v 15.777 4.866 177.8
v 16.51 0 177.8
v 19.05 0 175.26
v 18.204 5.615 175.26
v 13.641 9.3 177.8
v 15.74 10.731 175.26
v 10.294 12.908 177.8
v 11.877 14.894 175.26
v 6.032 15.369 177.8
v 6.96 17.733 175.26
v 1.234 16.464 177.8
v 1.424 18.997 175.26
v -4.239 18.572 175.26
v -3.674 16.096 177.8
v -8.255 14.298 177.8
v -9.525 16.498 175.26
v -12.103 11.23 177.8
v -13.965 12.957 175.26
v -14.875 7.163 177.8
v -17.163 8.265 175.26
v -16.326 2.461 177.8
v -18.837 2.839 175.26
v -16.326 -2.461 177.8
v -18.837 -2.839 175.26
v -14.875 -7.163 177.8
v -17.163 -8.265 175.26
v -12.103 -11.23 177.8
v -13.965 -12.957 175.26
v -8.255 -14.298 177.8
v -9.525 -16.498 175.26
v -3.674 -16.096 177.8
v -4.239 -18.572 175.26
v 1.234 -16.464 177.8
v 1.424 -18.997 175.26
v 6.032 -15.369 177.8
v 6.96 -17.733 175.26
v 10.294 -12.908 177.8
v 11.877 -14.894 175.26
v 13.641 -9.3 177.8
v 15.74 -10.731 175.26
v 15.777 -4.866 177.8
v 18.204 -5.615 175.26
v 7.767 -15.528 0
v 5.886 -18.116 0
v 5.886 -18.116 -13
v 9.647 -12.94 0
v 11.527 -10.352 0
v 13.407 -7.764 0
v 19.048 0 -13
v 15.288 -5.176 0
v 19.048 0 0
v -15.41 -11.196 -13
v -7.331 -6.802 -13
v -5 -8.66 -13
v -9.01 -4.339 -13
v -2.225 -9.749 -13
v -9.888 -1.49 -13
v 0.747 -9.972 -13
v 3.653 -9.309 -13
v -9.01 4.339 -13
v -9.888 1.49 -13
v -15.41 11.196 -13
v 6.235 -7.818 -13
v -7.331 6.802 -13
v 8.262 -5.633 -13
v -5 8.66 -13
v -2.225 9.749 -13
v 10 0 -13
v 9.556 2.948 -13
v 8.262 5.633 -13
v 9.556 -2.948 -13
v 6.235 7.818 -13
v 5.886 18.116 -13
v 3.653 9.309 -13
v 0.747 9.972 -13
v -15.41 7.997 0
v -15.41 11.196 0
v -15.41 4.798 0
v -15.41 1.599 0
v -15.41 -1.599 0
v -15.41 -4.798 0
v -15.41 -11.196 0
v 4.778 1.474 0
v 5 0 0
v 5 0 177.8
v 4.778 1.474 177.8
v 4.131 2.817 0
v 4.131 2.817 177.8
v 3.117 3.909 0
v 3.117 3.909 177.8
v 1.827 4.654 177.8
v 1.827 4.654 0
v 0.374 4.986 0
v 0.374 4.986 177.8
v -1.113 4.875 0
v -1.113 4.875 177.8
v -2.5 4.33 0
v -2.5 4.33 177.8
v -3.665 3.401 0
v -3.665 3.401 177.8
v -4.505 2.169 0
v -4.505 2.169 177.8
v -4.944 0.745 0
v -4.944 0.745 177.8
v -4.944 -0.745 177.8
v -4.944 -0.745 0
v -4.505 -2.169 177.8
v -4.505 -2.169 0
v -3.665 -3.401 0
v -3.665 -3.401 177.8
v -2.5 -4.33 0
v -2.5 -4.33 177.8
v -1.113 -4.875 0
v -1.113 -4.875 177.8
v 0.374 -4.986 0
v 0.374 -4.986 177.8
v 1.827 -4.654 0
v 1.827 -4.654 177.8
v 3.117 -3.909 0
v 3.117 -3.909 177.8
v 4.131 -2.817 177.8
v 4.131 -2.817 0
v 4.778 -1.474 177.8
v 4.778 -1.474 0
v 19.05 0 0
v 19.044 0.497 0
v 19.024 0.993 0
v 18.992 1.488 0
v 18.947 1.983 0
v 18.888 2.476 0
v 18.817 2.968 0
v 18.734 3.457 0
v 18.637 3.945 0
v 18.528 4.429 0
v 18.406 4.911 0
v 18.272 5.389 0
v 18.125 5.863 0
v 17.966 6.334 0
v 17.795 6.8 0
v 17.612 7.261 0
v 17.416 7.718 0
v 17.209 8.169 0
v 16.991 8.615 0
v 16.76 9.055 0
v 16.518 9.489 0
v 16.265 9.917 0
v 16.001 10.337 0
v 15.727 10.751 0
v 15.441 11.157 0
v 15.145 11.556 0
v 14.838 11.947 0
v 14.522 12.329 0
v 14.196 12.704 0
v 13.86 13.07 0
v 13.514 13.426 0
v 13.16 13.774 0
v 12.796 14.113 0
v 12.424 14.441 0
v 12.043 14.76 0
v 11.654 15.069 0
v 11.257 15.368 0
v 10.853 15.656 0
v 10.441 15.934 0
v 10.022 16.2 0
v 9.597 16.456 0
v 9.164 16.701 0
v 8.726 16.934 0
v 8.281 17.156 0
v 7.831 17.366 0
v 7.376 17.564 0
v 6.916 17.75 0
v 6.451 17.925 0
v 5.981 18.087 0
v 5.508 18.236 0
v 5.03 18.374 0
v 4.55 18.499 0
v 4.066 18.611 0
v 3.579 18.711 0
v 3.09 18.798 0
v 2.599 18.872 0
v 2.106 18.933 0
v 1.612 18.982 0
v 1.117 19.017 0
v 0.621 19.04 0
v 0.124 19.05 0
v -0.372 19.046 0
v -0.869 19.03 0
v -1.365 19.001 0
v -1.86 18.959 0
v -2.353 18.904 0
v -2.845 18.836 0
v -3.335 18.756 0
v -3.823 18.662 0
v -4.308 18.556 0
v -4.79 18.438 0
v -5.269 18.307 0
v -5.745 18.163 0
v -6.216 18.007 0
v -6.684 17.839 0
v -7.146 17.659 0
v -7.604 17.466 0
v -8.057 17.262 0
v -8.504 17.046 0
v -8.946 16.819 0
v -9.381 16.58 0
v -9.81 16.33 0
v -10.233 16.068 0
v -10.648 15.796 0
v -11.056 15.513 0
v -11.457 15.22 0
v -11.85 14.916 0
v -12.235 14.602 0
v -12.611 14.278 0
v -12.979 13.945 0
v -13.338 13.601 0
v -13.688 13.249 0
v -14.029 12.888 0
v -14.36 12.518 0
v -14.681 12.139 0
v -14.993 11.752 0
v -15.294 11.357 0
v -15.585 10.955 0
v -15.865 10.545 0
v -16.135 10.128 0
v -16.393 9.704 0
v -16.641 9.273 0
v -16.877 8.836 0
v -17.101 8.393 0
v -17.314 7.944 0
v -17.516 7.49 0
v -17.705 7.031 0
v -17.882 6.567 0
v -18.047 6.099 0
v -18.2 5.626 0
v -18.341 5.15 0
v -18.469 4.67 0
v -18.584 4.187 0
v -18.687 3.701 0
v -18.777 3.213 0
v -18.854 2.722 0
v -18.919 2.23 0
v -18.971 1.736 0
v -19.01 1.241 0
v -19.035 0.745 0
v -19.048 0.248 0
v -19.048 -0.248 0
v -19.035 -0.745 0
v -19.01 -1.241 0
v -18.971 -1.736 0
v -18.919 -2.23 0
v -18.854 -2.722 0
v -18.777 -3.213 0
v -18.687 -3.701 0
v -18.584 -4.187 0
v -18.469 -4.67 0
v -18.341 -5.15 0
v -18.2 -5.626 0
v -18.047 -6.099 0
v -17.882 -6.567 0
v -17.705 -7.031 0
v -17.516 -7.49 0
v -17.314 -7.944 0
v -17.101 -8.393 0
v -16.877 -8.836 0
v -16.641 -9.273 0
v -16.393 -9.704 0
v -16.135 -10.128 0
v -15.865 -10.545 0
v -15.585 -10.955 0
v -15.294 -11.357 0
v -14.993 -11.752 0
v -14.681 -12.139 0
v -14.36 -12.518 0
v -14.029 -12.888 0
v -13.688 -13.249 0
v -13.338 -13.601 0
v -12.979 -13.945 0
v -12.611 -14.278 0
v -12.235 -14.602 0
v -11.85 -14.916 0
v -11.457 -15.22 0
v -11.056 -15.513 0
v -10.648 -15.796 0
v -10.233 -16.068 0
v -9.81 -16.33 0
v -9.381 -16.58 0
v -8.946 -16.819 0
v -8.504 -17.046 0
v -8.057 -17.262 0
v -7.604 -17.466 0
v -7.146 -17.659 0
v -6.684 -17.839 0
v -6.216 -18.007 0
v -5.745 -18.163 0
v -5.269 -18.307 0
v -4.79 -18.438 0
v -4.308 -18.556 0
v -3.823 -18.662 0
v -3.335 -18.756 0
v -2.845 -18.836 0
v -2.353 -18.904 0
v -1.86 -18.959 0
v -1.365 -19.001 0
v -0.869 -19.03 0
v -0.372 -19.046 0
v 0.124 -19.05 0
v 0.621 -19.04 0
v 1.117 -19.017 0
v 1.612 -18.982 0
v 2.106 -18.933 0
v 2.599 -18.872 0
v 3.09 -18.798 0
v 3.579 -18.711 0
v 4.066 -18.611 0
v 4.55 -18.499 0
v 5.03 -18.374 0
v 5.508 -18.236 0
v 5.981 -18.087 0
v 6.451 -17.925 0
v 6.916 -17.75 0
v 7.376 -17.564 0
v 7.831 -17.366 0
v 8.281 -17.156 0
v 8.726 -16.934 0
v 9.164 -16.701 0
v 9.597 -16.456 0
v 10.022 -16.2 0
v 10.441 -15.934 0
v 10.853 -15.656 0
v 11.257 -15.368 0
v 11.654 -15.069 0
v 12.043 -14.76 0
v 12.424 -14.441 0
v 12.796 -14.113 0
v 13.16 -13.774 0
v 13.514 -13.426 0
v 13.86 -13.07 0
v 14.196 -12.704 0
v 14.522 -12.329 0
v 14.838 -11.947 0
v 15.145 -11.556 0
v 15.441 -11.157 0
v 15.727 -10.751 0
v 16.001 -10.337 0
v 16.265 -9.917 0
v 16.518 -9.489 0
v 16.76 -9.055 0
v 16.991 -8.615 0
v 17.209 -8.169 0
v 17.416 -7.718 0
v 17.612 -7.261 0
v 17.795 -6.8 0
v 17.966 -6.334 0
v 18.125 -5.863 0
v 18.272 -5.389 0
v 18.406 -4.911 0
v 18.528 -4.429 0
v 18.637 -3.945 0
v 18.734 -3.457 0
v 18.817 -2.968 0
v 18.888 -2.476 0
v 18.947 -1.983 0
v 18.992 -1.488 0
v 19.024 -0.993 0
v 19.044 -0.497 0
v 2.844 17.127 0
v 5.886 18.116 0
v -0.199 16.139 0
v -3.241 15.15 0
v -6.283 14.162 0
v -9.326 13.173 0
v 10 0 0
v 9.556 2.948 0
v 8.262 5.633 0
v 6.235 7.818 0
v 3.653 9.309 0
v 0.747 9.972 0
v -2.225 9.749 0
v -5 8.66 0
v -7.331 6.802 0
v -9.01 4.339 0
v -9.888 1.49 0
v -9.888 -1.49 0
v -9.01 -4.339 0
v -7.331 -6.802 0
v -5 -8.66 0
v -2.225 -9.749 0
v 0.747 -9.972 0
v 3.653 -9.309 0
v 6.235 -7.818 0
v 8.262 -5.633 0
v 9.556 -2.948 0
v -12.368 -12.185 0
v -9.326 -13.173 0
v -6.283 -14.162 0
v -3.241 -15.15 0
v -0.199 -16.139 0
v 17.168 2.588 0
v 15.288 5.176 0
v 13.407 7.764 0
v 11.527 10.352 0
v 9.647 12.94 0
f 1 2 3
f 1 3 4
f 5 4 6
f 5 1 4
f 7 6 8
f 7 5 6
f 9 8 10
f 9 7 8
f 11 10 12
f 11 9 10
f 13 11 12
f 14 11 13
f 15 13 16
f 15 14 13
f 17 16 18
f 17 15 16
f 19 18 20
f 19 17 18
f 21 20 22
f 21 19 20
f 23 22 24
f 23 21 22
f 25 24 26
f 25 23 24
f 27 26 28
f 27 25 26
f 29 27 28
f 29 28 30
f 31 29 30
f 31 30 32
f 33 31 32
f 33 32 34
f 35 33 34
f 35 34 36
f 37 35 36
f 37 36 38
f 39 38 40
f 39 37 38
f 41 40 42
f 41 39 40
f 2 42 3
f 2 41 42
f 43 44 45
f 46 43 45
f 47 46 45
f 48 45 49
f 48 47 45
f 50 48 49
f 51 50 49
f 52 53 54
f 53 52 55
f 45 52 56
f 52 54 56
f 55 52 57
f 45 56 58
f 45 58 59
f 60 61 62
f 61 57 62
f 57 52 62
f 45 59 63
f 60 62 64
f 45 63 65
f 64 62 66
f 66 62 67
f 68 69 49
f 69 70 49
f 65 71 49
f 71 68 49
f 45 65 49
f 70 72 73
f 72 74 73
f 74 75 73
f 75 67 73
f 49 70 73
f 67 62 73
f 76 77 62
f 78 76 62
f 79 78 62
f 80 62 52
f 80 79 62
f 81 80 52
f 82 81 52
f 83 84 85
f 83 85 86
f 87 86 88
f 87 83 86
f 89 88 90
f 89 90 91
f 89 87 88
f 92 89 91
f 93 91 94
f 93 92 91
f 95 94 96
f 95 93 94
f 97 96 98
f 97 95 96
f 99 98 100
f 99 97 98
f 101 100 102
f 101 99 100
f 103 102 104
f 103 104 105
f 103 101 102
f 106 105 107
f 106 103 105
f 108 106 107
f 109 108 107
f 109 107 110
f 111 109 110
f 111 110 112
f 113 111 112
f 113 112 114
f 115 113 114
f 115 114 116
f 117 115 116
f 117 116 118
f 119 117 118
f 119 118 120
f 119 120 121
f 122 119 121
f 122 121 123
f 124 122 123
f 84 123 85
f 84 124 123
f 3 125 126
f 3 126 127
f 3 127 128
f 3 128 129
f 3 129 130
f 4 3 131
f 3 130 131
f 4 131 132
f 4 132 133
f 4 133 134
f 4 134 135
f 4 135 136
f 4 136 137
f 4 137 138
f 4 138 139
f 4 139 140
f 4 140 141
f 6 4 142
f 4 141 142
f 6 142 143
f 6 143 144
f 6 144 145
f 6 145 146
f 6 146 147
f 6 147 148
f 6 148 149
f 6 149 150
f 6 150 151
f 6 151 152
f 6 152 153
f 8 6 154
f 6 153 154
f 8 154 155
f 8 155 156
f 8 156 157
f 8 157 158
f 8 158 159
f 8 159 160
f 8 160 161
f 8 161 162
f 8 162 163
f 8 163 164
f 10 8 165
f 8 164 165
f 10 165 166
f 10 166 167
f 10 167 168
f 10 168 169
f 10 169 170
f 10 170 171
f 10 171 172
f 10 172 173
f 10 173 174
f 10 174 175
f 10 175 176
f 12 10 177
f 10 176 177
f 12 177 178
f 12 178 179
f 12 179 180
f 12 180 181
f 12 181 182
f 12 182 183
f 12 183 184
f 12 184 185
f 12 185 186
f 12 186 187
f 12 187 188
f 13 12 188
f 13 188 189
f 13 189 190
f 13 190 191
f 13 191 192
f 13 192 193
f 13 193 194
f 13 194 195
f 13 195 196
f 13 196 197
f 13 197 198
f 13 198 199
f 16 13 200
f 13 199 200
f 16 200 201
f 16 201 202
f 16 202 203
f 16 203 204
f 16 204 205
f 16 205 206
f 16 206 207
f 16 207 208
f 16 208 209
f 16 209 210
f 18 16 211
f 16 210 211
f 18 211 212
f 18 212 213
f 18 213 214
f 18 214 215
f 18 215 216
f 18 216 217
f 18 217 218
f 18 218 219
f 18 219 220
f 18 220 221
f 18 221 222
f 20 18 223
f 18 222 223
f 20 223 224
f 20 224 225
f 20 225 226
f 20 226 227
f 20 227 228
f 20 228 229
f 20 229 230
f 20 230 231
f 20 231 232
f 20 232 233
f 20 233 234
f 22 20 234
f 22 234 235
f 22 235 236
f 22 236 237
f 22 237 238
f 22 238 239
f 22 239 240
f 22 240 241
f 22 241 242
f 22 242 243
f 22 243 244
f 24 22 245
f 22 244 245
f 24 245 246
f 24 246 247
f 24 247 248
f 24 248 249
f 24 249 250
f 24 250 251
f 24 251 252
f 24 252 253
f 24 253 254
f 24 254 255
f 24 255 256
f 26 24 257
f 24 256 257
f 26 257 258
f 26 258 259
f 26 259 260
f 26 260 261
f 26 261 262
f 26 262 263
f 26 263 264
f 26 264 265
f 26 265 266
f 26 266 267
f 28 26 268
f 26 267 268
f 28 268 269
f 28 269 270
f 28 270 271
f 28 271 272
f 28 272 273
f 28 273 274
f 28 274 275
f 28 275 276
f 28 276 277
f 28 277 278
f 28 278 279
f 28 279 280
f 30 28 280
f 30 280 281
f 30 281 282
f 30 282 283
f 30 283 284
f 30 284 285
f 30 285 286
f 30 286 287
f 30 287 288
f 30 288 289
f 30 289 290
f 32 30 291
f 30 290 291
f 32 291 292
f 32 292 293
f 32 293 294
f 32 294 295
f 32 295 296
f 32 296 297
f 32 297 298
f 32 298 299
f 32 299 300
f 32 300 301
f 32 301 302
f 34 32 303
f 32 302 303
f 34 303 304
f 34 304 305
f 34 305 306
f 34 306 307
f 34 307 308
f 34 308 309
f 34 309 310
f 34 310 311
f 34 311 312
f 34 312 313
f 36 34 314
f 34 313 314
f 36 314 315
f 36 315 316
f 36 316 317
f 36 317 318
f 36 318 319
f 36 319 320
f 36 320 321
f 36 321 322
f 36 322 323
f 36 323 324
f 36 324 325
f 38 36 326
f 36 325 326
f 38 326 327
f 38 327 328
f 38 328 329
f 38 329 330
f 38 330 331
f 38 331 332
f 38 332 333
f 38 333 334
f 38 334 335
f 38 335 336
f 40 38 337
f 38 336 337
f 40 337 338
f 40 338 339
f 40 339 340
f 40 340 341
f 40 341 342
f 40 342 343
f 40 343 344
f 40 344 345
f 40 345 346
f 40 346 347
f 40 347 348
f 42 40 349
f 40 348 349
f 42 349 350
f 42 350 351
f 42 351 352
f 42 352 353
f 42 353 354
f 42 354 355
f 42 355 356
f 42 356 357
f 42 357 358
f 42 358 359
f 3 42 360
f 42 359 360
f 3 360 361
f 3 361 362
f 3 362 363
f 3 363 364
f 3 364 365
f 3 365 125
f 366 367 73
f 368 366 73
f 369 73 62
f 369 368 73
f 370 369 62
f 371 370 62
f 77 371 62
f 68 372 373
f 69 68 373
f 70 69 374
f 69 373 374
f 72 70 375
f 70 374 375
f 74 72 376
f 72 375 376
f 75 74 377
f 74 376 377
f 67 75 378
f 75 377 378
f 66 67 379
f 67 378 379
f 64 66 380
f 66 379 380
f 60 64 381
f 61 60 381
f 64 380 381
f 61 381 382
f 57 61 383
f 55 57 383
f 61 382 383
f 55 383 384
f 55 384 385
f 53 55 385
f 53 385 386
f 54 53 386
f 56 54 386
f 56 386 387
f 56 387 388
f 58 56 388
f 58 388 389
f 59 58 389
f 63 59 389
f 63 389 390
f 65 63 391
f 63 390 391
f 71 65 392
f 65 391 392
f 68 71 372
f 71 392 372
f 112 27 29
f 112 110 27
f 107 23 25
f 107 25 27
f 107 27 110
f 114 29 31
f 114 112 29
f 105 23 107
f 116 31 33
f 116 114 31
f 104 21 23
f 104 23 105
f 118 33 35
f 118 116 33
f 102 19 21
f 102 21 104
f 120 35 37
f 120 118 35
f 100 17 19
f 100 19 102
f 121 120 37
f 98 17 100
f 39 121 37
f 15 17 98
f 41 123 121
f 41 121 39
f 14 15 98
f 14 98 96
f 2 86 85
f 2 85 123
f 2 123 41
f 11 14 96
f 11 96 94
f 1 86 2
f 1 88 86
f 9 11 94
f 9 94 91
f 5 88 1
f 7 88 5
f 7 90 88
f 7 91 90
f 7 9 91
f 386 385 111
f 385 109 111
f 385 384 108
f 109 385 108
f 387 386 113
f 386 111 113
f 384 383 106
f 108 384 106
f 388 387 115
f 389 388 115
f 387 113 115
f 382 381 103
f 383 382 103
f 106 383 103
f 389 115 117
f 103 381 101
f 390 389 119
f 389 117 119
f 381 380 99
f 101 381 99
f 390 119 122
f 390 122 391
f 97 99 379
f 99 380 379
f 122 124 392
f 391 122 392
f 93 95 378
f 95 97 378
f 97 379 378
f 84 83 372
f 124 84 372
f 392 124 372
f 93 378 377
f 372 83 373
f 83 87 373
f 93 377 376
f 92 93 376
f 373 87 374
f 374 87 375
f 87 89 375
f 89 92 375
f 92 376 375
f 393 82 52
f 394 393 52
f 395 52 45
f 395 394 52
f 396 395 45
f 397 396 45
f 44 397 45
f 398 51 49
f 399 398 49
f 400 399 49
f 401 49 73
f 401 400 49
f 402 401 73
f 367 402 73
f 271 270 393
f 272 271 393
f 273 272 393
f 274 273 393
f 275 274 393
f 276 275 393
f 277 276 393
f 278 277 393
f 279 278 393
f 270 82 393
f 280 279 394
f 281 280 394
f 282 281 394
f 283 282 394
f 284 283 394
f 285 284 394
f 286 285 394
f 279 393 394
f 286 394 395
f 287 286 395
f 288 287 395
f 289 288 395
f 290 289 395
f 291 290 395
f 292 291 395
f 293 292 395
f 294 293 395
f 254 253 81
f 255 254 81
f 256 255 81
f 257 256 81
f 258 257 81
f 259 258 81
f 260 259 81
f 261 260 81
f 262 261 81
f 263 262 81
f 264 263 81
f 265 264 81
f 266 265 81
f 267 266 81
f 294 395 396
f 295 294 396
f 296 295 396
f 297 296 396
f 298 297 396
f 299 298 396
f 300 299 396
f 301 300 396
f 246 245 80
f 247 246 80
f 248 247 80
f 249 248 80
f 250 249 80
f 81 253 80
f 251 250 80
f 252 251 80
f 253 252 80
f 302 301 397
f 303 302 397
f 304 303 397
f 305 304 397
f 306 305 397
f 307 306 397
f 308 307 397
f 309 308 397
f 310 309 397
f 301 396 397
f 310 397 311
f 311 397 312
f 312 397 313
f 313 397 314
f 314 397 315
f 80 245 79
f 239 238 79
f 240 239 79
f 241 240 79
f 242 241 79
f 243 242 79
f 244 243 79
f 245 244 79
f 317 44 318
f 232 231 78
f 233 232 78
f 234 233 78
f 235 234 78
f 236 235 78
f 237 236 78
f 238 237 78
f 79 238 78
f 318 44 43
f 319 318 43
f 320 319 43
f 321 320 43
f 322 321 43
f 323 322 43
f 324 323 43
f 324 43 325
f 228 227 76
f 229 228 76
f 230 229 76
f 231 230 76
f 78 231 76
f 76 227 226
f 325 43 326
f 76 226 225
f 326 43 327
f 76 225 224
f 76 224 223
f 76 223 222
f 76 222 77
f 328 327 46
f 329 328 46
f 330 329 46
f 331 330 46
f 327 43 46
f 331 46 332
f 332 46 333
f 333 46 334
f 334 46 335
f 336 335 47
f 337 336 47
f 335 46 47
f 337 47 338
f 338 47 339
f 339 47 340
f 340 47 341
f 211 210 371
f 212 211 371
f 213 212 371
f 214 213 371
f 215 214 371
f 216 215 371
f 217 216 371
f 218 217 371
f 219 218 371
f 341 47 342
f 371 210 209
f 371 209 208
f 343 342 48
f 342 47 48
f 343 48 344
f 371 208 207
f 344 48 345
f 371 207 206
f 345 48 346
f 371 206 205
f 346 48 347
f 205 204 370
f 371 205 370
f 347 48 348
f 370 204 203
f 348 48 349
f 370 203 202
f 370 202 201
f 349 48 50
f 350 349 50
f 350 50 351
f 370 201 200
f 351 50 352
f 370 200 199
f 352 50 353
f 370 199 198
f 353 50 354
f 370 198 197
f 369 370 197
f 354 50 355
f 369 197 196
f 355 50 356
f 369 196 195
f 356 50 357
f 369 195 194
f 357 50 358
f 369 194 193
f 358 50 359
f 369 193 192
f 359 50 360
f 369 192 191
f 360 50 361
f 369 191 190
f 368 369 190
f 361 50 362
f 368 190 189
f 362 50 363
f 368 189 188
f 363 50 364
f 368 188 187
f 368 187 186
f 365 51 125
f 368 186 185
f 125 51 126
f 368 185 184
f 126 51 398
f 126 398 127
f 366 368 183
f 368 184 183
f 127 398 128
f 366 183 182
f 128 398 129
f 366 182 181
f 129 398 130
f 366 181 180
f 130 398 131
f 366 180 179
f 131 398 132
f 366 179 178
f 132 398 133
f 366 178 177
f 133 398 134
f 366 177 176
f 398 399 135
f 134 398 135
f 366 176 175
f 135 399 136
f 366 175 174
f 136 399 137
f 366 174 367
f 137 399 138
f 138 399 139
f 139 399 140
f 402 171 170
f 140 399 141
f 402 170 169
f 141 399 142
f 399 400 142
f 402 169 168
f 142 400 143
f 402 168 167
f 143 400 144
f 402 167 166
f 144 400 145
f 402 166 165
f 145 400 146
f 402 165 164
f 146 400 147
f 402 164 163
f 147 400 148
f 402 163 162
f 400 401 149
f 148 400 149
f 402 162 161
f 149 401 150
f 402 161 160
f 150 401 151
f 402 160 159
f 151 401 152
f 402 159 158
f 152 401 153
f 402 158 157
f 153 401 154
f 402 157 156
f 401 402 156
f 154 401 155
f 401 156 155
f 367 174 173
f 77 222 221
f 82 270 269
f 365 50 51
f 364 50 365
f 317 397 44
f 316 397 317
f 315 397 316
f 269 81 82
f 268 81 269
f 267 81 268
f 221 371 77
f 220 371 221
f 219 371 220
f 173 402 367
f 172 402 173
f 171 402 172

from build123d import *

# Parameters (mm, degrees)
F0_R     = 19.05
F0_R_2   = 5.000003
F1_DEPTH = 177.8
F2_R     = 10.000005
F3_DEPTH = 12.999999
F4_SIZE  = 2.54


with BuildPart() as f1:
    # F0 (on Top) → F1 (new body)
    with BuildSketch(Plane.XY):
        Circle(F0_R)
        Circle(F0_R_2, mode=Mode.SUBTRACT)
    extrude(amount=F1_DEPTH)

    # F2 (on Top) → F3 (join)
    with BuildSketch(Plane.XY):
        Polygon((5.886217, -18.115914), (19.048199, 0), (5.886217, 18.115914), (-15.410317, 11.19625), (-15.410317, -11.19625), align=None)
        Circle(F2_R, mode=Mode.SUBTRACT)
    extrude(amount=-F3_DEPTH)

    # F4
    f4_edges = [f1.edges().sort_by_distance(p)[0] for p in [
        (-19.05, 0, 177.8),
    ]]
    chamfer(f4_edges, length=F4_SIZE)


solid = f1.part
